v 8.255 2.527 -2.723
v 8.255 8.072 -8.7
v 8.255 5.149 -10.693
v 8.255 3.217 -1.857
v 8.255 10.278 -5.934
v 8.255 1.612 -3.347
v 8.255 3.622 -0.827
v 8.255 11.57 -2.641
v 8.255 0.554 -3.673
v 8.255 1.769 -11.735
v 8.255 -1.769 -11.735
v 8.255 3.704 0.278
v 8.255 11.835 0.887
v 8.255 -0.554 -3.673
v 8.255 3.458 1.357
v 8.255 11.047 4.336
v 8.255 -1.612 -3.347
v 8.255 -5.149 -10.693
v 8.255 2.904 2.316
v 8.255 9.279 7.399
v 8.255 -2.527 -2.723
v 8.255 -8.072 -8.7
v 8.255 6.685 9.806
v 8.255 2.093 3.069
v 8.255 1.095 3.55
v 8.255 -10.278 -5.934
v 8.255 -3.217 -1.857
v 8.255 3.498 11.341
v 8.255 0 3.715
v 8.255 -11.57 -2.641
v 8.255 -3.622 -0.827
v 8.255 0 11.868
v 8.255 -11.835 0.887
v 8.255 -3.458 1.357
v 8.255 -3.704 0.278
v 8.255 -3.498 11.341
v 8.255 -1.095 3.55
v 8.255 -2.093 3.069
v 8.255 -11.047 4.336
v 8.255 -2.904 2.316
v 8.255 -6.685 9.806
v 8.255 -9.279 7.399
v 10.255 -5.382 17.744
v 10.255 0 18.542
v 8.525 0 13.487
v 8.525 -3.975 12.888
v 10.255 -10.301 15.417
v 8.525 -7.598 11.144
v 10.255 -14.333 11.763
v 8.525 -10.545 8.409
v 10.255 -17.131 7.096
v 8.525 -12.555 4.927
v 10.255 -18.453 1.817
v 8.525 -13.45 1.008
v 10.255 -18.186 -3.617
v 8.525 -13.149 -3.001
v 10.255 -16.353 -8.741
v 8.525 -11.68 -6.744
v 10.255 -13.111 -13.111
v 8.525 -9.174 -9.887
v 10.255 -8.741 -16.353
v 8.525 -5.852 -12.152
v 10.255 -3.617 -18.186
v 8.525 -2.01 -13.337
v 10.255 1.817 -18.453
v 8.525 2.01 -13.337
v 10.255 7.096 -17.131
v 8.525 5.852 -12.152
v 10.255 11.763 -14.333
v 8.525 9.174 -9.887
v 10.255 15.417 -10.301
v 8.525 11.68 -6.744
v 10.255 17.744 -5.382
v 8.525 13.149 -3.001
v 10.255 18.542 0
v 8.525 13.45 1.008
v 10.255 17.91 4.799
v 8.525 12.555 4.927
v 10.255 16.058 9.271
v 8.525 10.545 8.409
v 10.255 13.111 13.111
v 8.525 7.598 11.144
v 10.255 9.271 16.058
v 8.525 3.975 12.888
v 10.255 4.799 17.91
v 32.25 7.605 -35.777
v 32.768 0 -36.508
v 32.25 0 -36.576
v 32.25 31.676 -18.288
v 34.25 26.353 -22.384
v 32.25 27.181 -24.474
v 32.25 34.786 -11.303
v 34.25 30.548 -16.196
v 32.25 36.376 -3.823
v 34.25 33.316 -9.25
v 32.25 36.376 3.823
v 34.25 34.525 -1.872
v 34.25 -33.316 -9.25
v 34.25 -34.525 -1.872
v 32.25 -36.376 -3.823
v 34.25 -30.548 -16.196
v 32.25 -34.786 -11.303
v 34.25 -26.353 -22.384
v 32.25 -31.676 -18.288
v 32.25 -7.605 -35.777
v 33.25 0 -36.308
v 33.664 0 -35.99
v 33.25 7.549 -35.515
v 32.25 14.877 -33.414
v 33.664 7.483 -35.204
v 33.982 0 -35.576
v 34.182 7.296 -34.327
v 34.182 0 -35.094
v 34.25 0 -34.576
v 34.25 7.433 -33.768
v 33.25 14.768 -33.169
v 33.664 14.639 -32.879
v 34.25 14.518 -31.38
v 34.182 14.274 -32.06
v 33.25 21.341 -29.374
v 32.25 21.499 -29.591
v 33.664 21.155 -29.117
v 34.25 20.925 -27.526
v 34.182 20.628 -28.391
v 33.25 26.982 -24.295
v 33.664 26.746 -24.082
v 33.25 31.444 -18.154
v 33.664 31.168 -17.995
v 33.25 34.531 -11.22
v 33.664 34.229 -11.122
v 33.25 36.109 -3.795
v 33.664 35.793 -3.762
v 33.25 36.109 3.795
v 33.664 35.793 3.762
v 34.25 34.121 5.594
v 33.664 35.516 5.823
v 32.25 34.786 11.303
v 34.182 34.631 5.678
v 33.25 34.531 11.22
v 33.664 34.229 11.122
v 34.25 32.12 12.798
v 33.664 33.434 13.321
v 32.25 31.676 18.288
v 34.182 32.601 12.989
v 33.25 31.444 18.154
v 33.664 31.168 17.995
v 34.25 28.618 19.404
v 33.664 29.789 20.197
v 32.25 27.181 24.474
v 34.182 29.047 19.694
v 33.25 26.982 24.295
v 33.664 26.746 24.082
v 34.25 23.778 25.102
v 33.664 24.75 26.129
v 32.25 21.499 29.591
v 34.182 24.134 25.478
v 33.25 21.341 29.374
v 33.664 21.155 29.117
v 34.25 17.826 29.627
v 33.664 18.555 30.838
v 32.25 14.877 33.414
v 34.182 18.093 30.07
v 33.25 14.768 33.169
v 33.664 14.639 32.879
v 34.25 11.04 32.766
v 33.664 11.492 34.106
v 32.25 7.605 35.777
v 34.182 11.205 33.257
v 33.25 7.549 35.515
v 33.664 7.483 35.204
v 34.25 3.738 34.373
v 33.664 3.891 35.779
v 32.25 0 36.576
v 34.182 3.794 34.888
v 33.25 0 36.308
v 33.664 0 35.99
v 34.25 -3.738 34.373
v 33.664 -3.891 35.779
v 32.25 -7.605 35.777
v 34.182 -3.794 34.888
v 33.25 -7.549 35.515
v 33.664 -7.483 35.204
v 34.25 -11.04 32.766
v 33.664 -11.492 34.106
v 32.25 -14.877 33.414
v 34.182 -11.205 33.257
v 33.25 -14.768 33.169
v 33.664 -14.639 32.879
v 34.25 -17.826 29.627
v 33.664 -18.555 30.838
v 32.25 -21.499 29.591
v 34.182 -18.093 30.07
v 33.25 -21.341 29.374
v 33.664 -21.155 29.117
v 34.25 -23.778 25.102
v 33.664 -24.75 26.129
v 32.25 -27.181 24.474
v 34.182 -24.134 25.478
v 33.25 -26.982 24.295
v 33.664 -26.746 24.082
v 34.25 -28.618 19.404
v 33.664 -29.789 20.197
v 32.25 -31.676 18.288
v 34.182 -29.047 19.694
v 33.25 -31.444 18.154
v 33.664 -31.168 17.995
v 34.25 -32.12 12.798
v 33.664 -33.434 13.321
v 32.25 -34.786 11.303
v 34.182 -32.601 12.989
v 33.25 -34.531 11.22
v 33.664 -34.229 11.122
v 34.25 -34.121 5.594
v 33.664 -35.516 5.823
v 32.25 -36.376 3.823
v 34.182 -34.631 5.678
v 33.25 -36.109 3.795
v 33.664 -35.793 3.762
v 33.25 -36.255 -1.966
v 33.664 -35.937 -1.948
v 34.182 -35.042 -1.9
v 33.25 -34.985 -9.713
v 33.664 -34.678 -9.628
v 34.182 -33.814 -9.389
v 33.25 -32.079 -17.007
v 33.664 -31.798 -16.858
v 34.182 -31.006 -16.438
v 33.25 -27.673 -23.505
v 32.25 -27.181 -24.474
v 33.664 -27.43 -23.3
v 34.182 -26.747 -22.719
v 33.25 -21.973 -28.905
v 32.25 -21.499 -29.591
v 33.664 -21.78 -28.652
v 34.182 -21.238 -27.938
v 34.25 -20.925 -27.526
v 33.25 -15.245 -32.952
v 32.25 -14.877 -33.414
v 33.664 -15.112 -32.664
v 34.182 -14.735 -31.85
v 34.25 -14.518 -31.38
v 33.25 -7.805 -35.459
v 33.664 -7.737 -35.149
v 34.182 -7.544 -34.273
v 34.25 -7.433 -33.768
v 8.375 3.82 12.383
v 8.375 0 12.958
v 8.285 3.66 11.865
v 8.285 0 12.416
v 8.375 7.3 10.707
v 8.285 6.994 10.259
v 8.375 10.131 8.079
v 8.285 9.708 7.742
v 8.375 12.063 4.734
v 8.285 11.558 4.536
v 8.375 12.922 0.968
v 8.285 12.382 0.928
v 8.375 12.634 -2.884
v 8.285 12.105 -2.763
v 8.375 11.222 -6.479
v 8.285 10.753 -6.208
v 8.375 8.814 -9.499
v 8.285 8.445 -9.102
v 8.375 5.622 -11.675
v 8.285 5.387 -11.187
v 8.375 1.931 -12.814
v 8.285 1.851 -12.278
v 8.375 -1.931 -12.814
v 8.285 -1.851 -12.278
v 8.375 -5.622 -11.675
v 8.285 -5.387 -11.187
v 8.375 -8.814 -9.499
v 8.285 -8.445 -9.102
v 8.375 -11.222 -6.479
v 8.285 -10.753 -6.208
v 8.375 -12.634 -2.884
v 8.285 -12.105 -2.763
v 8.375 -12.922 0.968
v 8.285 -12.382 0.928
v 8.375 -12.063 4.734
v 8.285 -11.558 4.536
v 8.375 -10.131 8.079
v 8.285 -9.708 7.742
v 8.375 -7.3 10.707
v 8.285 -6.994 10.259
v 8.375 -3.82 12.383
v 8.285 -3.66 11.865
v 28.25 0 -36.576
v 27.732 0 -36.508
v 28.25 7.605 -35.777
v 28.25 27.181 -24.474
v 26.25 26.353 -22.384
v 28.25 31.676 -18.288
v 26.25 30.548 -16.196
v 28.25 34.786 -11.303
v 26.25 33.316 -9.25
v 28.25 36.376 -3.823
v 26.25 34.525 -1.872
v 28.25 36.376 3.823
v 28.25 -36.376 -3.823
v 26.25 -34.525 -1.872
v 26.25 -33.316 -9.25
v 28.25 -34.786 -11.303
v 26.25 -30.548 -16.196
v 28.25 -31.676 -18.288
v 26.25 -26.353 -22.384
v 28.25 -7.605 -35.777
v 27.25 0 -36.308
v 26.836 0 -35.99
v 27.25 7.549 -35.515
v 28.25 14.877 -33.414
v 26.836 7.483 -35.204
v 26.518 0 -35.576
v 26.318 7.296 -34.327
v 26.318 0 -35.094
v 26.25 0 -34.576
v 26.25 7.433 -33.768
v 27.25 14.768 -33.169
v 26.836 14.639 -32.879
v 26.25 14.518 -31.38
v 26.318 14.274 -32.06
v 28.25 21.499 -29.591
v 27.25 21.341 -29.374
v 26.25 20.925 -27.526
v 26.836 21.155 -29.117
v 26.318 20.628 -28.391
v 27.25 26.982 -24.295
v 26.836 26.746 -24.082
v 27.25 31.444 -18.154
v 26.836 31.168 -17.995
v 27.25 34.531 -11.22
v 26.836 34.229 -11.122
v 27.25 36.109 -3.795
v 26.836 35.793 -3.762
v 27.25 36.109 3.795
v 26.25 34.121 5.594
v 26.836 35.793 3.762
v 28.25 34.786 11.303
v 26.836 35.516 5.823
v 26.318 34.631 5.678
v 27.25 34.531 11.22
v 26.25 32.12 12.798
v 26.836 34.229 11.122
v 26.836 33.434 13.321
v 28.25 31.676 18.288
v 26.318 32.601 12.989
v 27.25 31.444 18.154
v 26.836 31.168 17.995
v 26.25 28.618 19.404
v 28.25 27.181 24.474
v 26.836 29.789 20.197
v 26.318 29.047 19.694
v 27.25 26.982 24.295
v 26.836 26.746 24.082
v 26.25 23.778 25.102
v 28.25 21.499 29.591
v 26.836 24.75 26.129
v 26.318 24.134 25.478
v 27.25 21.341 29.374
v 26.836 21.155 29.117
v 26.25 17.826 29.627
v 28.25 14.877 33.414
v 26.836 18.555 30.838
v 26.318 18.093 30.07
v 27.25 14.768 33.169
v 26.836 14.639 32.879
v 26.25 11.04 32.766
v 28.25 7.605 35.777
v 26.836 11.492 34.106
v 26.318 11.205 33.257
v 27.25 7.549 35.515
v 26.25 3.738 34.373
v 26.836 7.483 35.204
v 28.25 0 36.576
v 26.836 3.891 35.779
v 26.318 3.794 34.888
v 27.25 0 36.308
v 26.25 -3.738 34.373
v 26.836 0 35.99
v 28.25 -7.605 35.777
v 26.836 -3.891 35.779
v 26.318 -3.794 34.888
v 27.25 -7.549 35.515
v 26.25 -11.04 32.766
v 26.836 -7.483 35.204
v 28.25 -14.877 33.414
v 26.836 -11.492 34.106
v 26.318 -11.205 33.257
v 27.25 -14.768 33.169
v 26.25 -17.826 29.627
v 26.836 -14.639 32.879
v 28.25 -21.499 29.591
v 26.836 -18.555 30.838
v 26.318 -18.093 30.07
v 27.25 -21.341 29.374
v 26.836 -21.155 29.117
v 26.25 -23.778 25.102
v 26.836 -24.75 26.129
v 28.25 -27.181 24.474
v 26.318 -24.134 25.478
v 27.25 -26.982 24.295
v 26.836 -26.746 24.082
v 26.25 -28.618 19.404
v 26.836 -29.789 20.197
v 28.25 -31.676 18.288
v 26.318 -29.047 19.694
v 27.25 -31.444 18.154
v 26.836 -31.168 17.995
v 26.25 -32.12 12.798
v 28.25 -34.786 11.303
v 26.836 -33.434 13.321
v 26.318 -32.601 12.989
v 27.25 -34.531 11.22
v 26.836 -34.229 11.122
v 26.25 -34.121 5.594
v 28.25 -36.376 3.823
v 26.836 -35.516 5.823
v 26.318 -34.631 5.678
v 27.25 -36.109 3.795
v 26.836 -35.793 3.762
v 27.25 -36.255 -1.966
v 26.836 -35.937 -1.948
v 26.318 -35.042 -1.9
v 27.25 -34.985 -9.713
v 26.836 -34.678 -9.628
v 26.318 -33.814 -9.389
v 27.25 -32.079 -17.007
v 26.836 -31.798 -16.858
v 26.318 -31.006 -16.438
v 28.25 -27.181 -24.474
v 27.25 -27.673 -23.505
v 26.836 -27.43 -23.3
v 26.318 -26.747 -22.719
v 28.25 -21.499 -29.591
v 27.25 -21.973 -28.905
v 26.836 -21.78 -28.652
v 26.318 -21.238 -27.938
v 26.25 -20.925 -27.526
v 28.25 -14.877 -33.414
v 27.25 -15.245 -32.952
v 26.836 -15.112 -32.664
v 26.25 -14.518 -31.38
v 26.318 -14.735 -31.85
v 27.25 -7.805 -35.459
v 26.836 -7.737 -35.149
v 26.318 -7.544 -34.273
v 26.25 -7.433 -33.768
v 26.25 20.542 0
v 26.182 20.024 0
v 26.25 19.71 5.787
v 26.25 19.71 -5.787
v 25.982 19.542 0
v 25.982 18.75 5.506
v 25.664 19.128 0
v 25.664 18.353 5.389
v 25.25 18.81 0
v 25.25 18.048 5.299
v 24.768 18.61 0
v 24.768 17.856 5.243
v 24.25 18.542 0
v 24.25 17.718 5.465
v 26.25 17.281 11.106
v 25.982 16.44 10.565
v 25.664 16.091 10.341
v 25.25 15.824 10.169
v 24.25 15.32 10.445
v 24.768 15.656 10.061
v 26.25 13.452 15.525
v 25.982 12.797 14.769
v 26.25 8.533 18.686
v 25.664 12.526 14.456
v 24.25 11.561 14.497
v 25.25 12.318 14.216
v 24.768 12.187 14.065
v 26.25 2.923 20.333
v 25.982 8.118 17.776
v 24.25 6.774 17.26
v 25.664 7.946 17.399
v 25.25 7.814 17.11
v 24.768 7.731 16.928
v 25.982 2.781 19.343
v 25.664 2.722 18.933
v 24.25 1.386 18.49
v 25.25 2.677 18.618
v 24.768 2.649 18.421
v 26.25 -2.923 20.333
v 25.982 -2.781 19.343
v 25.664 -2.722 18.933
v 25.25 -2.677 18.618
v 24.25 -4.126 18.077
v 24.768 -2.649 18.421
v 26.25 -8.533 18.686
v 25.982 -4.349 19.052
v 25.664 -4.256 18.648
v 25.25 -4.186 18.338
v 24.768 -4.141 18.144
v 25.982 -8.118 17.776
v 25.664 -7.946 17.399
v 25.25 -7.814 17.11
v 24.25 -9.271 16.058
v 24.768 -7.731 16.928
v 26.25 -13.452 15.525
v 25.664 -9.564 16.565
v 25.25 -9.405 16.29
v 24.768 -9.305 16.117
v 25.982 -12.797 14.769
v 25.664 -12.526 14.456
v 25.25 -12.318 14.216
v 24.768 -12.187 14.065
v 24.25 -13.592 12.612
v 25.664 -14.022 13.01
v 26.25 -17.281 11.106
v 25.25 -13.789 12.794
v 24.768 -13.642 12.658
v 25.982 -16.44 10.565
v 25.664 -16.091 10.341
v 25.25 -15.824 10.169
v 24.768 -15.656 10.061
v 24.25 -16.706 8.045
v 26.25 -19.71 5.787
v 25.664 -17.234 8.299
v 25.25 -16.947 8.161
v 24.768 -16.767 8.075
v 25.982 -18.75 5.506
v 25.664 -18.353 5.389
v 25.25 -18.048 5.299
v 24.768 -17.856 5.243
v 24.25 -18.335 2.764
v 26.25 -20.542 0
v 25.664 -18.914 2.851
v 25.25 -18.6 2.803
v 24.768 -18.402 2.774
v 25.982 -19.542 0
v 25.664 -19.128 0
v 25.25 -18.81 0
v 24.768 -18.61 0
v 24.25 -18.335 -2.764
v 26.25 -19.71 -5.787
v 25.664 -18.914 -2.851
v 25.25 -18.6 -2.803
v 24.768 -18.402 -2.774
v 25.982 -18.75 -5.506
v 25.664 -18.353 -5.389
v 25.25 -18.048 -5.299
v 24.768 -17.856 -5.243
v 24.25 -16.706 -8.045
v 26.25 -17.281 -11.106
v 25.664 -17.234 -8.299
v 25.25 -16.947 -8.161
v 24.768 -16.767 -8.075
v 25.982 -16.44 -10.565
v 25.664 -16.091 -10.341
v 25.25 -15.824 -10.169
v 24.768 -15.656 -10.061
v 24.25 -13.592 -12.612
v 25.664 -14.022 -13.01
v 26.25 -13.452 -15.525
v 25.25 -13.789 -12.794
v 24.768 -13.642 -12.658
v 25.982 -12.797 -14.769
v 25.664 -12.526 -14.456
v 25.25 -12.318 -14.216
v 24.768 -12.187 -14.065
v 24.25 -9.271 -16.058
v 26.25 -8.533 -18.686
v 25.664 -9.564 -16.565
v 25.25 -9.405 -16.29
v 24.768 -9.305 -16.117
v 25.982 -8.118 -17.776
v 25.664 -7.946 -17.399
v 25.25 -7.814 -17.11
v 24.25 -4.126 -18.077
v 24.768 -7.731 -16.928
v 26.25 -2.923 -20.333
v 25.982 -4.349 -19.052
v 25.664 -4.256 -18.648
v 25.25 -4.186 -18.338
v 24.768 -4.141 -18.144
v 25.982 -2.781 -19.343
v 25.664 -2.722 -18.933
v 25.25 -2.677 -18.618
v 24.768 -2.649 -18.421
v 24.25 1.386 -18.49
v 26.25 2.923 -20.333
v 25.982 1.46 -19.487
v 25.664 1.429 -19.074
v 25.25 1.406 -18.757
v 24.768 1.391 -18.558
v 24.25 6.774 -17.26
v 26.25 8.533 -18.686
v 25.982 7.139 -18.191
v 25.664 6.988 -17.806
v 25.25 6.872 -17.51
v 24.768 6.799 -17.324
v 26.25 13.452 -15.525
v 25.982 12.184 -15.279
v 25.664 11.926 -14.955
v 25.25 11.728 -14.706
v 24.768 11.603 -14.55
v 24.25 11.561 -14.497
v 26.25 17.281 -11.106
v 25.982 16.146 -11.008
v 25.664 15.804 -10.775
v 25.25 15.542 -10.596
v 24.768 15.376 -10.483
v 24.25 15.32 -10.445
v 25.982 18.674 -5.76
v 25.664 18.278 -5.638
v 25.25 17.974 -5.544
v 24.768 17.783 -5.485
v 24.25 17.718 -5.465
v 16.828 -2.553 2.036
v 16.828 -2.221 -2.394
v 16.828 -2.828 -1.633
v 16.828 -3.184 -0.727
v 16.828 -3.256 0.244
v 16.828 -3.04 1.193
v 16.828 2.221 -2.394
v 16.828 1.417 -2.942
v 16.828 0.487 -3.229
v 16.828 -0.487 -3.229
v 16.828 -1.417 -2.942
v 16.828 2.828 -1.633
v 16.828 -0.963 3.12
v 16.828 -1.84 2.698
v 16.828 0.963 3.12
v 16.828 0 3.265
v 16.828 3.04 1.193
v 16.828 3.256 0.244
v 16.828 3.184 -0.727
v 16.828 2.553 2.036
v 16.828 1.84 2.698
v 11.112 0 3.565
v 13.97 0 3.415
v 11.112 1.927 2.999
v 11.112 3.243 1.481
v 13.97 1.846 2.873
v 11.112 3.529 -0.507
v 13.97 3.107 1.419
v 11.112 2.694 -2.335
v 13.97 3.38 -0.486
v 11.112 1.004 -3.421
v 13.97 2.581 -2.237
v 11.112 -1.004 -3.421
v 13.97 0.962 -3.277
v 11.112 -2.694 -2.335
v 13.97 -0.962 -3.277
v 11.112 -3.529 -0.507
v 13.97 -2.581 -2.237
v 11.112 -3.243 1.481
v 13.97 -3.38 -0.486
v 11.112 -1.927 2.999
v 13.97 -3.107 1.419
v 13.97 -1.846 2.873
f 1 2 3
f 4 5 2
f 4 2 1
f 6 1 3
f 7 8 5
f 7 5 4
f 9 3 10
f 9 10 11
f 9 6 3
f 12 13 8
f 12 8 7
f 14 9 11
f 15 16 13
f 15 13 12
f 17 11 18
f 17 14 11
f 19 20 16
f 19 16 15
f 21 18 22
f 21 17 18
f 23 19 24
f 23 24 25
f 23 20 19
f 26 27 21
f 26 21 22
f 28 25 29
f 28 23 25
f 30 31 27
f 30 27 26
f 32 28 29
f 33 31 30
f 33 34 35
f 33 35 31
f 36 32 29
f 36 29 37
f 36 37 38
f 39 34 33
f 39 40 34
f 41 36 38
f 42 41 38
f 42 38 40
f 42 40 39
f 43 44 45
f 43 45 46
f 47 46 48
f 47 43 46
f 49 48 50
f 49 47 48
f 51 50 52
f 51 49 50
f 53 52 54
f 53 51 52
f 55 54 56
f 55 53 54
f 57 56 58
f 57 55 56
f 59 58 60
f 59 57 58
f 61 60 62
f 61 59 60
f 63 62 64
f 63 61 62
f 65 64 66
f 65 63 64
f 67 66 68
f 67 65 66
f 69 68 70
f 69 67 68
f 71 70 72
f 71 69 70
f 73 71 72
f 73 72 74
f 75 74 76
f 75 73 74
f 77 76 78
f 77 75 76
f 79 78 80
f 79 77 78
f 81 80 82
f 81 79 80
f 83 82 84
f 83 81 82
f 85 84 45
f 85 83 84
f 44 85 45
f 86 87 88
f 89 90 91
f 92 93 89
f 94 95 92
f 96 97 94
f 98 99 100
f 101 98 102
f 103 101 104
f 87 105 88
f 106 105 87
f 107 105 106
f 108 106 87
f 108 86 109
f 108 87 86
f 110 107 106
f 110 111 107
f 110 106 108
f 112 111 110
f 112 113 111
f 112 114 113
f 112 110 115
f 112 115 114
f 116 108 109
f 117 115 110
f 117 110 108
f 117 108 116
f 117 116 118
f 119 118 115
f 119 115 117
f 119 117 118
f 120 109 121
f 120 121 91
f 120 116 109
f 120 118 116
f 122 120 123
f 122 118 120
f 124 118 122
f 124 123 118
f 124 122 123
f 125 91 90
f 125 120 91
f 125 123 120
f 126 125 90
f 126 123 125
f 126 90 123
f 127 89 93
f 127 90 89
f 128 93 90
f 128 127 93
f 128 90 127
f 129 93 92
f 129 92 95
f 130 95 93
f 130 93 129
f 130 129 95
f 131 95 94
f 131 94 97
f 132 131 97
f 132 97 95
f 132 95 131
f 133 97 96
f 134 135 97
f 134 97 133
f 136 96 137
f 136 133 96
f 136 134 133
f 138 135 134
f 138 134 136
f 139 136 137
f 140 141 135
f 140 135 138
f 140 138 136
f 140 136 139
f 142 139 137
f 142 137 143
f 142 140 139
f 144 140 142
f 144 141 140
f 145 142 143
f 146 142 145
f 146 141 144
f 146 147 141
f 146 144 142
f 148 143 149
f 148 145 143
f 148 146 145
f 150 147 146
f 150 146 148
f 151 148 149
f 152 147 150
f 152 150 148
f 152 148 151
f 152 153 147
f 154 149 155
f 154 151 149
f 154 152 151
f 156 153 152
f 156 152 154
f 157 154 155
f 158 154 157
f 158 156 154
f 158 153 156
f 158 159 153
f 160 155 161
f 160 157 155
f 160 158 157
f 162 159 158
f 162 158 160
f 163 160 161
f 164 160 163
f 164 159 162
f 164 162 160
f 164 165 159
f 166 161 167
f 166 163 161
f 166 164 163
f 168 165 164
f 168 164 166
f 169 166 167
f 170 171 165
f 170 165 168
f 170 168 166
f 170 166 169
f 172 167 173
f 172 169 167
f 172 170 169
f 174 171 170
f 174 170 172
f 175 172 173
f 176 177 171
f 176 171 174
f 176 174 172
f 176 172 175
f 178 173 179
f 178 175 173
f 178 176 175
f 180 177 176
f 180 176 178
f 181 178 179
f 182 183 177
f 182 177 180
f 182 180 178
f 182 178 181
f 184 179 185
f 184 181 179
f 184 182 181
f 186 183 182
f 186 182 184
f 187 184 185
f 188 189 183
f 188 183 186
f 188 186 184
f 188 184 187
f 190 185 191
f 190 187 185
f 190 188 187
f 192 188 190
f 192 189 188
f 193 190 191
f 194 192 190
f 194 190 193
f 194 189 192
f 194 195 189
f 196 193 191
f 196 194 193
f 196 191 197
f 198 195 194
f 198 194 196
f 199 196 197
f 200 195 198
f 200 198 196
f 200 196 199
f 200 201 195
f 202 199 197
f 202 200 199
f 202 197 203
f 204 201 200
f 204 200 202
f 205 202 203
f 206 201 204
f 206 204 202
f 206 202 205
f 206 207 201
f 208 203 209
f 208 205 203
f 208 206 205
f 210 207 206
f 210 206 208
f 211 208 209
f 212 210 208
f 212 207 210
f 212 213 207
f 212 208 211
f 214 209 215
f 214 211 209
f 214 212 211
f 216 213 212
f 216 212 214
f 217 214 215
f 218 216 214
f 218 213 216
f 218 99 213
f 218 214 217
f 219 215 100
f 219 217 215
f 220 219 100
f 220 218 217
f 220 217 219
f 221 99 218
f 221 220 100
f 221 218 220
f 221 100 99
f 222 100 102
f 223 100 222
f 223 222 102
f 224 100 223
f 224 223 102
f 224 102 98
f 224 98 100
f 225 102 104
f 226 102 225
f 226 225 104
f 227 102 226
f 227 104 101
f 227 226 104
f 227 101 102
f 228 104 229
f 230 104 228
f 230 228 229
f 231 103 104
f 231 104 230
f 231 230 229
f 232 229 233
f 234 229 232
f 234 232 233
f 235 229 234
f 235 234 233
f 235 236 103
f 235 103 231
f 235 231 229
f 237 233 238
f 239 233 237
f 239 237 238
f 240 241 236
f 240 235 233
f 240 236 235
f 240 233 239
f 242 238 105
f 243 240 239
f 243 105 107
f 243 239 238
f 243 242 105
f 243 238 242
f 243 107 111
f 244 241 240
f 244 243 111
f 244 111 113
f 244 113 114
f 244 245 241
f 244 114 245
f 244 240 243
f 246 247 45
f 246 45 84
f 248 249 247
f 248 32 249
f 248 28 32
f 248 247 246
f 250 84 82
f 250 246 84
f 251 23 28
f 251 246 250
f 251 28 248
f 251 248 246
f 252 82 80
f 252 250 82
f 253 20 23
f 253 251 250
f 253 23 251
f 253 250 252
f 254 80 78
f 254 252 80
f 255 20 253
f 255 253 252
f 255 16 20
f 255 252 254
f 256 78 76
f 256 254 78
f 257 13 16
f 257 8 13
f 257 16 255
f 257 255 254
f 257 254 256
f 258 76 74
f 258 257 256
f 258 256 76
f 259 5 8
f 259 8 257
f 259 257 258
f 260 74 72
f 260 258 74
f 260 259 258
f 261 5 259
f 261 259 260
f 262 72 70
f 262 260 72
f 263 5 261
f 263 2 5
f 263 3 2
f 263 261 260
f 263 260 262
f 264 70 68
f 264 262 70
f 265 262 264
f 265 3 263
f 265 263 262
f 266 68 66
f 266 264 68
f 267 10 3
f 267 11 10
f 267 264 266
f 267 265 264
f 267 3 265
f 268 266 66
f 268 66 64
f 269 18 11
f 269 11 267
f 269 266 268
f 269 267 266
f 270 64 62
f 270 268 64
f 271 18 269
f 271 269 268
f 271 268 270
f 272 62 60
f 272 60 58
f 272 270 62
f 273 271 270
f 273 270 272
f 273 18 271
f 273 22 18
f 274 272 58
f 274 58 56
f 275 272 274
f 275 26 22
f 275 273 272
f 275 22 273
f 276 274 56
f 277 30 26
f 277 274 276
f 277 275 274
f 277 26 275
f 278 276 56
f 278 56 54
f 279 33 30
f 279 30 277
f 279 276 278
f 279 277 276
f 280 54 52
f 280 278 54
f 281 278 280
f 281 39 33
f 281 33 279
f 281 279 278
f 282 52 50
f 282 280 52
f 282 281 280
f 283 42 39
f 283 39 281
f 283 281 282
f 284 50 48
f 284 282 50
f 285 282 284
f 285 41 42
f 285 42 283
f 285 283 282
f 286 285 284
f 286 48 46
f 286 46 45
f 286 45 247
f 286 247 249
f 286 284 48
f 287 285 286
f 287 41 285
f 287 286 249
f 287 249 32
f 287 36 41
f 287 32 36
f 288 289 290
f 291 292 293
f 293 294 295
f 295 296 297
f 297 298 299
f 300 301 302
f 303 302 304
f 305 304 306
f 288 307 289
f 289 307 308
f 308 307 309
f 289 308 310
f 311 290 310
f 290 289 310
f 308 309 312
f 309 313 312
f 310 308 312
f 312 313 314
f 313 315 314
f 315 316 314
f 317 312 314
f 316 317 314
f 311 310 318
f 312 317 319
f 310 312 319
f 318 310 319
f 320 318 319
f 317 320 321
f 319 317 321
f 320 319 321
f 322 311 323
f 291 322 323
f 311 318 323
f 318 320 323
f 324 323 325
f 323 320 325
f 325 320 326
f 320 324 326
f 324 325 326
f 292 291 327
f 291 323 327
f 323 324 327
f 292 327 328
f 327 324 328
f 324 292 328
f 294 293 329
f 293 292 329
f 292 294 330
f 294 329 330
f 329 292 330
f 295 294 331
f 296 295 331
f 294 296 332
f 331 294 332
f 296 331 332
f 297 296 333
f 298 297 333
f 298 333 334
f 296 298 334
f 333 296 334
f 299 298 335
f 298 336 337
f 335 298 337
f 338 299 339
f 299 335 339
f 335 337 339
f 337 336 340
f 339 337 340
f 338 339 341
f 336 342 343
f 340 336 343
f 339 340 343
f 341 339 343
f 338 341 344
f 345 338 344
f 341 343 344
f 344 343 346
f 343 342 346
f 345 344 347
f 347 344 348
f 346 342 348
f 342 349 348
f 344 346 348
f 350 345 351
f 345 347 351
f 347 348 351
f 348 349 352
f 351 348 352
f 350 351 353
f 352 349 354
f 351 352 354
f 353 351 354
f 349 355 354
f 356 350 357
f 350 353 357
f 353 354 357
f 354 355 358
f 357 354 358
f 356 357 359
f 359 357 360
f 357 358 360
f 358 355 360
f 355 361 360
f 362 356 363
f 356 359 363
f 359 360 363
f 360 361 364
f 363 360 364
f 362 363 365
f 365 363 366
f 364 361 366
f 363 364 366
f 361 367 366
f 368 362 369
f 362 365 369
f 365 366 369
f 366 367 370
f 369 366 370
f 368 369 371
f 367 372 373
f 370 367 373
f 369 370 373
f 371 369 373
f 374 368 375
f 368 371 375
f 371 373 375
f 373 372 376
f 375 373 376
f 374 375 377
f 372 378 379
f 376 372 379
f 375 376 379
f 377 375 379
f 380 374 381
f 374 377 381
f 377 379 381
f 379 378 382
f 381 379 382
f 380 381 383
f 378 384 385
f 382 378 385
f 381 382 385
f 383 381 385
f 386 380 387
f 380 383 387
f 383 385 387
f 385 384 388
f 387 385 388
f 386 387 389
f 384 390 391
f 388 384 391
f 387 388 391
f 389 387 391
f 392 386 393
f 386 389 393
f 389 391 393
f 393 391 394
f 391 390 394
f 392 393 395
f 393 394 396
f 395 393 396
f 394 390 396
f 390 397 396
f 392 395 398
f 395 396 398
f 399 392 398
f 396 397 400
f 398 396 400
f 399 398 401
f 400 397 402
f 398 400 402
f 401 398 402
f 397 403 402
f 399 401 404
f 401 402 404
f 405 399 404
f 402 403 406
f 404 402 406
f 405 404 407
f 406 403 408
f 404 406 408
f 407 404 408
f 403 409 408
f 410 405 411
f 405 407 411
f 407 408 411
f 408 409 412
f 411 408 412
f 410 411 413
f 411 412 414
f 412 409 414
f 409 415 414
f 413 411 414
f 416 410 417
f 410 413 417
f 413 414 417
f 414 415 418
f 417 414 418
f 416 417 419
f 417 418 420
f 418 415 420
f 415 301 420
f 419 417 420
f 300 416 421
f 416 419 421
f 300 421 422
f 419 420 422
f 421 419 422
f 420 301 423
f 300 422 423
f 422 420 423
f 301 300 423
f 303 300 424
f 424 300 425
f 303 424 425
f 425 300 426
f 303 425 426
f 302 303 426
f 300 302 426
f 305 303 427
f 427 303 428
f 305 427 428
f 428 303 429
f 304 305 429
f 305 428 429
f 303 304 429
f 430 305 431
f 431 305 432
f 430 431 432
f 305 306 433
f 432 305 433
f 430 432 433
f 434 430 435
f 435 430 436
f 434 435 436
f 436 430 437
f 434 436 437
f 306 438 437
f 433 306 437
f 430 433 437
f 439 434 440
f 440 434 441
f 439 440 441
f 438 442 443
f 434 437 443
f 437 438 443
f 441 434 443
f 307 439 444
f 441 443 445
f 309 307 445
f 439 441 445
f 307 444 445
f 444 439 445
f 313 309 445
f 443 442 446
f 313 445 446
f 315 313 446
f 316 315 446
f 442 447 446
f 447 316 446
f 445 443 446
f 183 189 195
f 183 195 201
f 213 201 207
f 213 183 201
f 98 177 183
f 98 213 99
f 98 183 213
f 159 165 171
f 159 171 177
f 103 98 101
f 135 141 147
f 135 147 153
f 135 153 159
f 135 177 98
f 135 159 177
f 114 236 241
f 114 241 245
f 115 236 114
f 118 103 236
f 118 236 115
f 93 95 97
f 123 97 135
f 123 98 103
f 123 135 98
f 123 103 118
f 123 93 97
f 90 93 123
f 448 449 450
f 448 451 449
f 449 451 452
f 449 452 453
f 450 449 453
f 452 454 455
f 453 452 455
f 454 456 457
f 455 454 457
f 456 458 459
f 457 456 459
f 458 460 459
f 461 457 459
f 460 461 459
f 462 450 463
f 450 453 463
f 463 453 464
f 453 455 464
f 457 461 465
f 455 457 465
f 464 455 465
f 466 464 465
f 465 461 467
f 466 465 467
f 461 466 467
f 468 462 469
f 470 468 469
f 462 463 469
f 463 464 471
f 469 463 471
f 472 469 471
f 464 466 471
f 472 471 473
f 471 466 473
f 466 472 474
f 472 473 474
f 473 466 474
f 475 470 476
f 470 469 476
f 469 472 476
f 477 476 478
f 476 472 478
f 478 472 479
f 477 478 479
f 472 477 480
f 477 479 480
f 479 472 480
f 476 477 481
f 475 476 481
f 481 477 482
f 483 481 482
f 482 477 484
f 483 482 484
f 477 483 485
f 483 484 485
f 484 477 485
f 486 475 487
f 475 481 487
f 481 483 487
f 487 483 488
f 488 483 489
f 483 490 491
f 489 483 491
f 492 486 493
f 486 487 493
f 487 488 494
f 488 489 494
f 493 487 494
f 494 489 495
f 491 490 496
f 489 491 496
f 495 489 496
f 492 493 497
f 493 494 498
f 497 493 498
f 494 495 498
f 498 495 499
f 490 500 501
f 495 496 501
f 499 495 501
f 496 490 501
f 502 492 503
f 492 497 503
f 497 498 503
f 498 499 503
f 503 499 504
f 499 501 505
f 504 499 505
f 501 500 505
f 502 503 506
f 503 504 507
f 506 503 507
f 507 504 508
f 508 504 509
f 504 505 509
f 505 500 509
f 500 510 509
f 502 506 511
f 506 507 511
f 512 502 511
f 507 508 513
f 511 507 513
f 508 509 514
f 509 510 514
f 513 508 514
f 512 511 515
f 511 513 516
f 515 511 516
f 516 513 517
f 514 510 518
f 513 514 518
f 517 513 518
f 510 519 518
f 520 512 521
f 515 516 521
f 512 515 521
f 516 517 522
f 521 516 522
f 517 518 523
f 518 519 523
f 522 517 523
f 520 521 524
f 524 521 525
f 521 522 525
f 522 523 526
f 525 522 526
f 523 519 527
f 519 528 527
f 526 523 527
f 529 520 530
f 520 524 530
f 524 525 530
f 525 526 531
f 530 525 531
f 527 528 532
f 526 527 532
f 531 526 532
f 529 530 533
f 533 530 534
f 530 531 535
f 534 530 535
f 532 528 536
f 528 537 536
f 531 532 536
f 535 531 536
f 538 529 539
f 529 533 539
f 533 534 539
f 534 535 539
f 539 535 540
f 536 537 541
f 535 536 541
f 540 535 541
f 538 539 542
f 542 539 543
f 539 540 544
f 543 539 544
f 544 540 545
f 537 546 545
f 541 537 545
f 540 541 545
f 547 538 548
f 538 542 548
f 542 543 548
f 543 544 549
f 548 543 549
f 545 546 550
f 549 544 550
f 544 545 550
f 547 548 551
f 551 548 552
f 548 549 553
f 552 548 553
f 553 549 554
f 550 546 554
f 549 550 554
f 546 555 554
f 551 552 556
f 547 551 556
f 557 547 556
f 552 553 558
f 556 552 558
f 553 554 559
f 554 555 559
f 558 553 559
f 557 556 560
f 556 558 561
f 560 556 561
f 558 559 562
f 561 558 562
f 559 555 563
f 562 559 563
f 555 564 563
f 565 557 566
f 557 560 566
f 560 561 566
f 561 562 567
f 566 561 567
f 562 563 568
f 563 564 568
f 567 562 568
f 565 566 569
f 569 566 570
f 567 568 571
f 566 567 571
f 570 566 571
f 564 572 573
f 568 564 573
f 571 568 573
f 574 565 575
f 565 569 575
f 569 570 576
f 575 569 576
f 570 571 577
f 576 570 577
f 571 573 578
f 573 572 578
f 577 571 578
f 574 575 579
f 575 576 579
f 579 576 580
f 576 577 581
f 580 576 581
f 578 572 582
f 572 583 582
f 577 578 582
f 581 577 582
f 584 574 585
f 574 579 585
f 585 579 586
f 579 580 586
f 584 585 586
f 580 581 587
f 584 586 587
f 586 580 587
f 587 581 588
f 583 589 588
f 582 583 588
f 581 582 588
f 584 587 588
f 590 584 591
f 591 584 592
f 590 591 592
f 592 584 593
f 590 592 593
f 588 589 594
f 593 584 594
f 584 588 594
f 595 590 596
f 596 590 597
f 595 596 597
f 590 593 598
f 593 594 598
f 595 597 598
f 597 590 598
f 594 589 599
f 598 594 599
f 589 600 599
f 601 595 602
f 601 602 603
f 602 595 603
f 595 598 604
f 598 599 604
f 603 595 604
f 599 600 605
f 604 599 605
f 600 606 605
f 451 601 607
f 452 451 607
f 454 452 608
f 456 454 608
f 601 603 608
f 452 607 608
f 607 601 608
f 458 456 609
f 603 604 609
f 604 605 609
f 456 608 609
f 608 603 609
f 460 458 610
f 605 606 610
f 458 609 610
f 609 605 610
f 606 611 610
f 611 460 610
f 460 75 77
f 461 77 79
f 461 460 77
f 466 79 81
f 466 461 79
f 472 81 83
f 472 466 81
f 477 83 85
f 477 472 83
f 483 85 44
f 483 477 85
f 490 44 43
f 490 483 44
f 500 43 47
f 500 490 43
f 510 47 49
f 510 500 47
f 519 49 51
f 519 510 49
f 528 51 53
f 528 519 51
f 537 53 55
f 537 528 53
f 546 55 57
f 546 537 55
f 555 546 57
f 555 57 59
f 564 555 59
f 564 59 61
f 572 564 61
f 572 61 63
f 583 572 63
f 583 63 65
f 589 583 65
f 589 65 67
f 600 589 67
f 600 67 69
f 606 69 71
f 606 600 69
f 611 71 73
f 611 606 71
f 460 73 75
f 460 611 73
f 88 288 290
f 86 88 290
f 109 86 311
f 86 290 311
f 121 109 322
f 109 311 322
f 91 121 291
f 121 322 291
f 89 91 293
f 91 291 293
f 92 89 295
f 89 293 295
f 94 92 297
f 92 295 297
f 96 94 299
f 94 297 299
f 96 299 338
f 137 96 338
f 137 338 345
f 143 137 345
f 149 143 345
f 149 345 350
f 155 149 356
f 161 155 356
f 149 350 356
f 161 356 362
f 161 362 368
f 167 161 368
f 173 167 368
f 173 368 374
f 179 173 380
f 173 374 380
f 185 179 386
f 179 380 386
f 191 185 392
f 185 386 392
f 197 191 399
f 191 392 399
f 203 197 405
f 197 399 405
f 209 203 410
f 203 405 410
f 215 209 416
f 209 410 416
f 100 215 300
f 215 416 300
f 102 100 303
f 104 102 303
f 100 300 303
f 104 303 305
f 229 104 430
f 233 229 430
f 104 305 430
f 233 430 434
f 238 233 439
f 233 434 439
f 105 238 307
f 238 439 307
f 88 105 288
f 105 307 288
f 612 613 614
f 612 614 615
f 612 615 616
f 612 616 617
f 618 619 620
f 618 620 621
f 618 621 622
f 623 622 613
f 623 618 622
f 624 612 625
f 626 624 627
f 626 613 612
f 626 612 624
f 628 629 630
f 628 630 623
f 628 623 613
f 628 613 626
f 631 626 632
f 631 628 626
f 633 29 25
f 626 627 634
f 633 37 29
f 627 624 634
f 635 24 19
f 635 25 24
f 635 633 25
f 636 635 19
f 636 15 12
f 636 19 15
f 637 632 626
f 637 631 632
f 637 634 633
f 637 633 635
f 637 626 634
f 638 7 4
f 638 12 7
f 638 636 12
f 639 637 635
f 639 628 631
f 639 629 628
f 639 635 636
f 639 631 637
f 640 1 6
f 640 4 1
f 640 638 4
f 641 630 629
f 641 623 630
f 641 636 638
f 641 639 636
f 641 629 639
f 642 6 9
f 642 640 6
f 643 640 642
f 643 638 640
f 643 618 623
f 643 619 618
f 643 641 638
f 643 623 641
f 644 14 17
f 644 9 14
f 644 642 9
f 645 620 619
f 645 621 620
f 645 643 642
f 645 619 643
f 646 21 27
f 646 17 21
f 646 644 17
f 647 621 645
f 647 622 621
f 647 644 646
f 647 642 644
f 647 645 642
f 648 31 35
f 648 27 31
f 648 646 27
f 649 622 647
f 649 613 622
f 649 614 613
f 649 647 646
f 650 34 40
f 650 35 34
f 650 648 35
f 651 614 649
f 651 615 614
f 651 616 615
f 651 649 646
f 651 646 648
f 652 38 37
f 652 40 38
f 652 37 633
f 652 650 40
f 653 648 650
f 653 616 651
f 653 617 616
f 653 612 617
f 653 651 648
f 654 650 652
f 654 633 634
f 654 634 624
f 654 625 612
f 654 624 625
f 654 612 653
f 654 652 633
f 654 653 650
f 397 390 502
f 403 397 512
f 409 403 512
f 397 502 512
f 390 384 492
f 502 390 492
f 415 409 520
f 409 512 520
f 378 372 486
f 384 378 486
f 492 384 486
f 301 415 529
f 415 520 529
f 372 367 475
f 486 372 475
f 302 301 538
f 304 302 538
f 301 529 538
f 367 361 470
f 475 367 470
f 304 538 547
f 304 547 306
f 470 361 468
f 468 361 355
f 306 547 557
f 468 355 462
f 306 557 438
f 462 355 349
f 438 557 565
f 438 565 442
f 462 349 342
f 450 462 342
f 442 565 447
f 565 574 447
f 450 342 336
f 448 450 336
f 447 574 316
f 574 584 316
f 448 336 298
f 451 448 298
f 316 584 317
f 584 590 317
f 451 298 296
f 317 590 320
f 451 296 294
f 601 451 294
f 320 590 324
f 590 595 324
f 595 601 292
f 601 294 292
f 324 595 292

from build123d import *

# Parameters (mm, degrees)
SKETCH1_W           = 17.995
SKETCH1_H           = 18.542
SKETCH2_R           = 3.71475
CUT_EXTRUDE1_DEPTH  = 8.5725
CUT_EXTRUDE1_TAPER  = 3
SKETCH3_R           = 36.576
BOSS_EXTRUDE1_DEPTH = 8
FILLET1_R           = 2
SKETCH4_R           = 18.542
SKETCH4_R_2         = 12.7
CUT_EXTRUDE2_DEPTH  = 2
FILLET2_R           = 5


with BuildPart() as part:
    # Sketch1 → Revolve1 (revolve)
    with BuildSketch(Plane.XY):
        with Locations((17.2525, 9.271)):
            Rectangle(SKETCH1_W, SKETCH1_H)
    revolve(axis=Axis((8.255, 0, 0), (1, 0, 0)))

    # Sketch2 → Cut-Extrude1 (cut)
    with BuildSketch(Plane.ZY.offset(-8.255)):
        Circle(SKETCH2_R)
    extrude(amount=-CUT_EXTRUDE1_DEPTH, taper=CUT_EXTRUDE1_TAPER, mode=Mode.SUBTRACT)

    # Sketch3 → Boss-Extrude1 (add)
    with BuildSketch(Plane(origin=(26.25, 0, 0), x_dir=(0, 0, -1), z_dir=(1, 0, 0))):
        Circle(SKETCH3_R)
    extrude(amount=BOSS_EXTRUDE1_DEPTH)

    # Fillet1
    fillet1_edges = [part.edges().sort_by_distance(p)[0] for p in [
        (26.25, -18.542, 0),
        (26.25, 0, 36.576),
        (34.25, 0, 36.576),
    ]]
    fillet(fillet1_edges, radius=FILLET1_R)

    # Sketch4 → Cut-Extrude2 (cut)
    with BuildSketch(Plane.ZY.offset(-8.255)):
        Circle(SKETCH4_R)
        Circle(SKETCH4_R_2, mode=Mode.SUBTRACT)
    extrude(amount=-CUT_EXTRUDE2_DEPTH, mode=Mode.SUBTRACT)

    # Sketch5 → Revolve2 (revolve)
    with BuildSketch(Plane(origin=(0, 0, 0), x_dir=(1, 0, 0), z_dir=(0, 1, 0))):
        Polygon((8.255, -12.7), (10.255, -18.542), (10.255, -12.7), align=None)
    revolve(axis=Axis((0, 0, 0), (1, 0, 0)))

    # Fillet2
    fillet2_edges = [part.edges().sort_by_distance(p)[0] for p in [
        (8.255, 0, -12.7),
    ]]
    fillet(fillet2_edges, radius=FILLET2_R)


solid = part.part
